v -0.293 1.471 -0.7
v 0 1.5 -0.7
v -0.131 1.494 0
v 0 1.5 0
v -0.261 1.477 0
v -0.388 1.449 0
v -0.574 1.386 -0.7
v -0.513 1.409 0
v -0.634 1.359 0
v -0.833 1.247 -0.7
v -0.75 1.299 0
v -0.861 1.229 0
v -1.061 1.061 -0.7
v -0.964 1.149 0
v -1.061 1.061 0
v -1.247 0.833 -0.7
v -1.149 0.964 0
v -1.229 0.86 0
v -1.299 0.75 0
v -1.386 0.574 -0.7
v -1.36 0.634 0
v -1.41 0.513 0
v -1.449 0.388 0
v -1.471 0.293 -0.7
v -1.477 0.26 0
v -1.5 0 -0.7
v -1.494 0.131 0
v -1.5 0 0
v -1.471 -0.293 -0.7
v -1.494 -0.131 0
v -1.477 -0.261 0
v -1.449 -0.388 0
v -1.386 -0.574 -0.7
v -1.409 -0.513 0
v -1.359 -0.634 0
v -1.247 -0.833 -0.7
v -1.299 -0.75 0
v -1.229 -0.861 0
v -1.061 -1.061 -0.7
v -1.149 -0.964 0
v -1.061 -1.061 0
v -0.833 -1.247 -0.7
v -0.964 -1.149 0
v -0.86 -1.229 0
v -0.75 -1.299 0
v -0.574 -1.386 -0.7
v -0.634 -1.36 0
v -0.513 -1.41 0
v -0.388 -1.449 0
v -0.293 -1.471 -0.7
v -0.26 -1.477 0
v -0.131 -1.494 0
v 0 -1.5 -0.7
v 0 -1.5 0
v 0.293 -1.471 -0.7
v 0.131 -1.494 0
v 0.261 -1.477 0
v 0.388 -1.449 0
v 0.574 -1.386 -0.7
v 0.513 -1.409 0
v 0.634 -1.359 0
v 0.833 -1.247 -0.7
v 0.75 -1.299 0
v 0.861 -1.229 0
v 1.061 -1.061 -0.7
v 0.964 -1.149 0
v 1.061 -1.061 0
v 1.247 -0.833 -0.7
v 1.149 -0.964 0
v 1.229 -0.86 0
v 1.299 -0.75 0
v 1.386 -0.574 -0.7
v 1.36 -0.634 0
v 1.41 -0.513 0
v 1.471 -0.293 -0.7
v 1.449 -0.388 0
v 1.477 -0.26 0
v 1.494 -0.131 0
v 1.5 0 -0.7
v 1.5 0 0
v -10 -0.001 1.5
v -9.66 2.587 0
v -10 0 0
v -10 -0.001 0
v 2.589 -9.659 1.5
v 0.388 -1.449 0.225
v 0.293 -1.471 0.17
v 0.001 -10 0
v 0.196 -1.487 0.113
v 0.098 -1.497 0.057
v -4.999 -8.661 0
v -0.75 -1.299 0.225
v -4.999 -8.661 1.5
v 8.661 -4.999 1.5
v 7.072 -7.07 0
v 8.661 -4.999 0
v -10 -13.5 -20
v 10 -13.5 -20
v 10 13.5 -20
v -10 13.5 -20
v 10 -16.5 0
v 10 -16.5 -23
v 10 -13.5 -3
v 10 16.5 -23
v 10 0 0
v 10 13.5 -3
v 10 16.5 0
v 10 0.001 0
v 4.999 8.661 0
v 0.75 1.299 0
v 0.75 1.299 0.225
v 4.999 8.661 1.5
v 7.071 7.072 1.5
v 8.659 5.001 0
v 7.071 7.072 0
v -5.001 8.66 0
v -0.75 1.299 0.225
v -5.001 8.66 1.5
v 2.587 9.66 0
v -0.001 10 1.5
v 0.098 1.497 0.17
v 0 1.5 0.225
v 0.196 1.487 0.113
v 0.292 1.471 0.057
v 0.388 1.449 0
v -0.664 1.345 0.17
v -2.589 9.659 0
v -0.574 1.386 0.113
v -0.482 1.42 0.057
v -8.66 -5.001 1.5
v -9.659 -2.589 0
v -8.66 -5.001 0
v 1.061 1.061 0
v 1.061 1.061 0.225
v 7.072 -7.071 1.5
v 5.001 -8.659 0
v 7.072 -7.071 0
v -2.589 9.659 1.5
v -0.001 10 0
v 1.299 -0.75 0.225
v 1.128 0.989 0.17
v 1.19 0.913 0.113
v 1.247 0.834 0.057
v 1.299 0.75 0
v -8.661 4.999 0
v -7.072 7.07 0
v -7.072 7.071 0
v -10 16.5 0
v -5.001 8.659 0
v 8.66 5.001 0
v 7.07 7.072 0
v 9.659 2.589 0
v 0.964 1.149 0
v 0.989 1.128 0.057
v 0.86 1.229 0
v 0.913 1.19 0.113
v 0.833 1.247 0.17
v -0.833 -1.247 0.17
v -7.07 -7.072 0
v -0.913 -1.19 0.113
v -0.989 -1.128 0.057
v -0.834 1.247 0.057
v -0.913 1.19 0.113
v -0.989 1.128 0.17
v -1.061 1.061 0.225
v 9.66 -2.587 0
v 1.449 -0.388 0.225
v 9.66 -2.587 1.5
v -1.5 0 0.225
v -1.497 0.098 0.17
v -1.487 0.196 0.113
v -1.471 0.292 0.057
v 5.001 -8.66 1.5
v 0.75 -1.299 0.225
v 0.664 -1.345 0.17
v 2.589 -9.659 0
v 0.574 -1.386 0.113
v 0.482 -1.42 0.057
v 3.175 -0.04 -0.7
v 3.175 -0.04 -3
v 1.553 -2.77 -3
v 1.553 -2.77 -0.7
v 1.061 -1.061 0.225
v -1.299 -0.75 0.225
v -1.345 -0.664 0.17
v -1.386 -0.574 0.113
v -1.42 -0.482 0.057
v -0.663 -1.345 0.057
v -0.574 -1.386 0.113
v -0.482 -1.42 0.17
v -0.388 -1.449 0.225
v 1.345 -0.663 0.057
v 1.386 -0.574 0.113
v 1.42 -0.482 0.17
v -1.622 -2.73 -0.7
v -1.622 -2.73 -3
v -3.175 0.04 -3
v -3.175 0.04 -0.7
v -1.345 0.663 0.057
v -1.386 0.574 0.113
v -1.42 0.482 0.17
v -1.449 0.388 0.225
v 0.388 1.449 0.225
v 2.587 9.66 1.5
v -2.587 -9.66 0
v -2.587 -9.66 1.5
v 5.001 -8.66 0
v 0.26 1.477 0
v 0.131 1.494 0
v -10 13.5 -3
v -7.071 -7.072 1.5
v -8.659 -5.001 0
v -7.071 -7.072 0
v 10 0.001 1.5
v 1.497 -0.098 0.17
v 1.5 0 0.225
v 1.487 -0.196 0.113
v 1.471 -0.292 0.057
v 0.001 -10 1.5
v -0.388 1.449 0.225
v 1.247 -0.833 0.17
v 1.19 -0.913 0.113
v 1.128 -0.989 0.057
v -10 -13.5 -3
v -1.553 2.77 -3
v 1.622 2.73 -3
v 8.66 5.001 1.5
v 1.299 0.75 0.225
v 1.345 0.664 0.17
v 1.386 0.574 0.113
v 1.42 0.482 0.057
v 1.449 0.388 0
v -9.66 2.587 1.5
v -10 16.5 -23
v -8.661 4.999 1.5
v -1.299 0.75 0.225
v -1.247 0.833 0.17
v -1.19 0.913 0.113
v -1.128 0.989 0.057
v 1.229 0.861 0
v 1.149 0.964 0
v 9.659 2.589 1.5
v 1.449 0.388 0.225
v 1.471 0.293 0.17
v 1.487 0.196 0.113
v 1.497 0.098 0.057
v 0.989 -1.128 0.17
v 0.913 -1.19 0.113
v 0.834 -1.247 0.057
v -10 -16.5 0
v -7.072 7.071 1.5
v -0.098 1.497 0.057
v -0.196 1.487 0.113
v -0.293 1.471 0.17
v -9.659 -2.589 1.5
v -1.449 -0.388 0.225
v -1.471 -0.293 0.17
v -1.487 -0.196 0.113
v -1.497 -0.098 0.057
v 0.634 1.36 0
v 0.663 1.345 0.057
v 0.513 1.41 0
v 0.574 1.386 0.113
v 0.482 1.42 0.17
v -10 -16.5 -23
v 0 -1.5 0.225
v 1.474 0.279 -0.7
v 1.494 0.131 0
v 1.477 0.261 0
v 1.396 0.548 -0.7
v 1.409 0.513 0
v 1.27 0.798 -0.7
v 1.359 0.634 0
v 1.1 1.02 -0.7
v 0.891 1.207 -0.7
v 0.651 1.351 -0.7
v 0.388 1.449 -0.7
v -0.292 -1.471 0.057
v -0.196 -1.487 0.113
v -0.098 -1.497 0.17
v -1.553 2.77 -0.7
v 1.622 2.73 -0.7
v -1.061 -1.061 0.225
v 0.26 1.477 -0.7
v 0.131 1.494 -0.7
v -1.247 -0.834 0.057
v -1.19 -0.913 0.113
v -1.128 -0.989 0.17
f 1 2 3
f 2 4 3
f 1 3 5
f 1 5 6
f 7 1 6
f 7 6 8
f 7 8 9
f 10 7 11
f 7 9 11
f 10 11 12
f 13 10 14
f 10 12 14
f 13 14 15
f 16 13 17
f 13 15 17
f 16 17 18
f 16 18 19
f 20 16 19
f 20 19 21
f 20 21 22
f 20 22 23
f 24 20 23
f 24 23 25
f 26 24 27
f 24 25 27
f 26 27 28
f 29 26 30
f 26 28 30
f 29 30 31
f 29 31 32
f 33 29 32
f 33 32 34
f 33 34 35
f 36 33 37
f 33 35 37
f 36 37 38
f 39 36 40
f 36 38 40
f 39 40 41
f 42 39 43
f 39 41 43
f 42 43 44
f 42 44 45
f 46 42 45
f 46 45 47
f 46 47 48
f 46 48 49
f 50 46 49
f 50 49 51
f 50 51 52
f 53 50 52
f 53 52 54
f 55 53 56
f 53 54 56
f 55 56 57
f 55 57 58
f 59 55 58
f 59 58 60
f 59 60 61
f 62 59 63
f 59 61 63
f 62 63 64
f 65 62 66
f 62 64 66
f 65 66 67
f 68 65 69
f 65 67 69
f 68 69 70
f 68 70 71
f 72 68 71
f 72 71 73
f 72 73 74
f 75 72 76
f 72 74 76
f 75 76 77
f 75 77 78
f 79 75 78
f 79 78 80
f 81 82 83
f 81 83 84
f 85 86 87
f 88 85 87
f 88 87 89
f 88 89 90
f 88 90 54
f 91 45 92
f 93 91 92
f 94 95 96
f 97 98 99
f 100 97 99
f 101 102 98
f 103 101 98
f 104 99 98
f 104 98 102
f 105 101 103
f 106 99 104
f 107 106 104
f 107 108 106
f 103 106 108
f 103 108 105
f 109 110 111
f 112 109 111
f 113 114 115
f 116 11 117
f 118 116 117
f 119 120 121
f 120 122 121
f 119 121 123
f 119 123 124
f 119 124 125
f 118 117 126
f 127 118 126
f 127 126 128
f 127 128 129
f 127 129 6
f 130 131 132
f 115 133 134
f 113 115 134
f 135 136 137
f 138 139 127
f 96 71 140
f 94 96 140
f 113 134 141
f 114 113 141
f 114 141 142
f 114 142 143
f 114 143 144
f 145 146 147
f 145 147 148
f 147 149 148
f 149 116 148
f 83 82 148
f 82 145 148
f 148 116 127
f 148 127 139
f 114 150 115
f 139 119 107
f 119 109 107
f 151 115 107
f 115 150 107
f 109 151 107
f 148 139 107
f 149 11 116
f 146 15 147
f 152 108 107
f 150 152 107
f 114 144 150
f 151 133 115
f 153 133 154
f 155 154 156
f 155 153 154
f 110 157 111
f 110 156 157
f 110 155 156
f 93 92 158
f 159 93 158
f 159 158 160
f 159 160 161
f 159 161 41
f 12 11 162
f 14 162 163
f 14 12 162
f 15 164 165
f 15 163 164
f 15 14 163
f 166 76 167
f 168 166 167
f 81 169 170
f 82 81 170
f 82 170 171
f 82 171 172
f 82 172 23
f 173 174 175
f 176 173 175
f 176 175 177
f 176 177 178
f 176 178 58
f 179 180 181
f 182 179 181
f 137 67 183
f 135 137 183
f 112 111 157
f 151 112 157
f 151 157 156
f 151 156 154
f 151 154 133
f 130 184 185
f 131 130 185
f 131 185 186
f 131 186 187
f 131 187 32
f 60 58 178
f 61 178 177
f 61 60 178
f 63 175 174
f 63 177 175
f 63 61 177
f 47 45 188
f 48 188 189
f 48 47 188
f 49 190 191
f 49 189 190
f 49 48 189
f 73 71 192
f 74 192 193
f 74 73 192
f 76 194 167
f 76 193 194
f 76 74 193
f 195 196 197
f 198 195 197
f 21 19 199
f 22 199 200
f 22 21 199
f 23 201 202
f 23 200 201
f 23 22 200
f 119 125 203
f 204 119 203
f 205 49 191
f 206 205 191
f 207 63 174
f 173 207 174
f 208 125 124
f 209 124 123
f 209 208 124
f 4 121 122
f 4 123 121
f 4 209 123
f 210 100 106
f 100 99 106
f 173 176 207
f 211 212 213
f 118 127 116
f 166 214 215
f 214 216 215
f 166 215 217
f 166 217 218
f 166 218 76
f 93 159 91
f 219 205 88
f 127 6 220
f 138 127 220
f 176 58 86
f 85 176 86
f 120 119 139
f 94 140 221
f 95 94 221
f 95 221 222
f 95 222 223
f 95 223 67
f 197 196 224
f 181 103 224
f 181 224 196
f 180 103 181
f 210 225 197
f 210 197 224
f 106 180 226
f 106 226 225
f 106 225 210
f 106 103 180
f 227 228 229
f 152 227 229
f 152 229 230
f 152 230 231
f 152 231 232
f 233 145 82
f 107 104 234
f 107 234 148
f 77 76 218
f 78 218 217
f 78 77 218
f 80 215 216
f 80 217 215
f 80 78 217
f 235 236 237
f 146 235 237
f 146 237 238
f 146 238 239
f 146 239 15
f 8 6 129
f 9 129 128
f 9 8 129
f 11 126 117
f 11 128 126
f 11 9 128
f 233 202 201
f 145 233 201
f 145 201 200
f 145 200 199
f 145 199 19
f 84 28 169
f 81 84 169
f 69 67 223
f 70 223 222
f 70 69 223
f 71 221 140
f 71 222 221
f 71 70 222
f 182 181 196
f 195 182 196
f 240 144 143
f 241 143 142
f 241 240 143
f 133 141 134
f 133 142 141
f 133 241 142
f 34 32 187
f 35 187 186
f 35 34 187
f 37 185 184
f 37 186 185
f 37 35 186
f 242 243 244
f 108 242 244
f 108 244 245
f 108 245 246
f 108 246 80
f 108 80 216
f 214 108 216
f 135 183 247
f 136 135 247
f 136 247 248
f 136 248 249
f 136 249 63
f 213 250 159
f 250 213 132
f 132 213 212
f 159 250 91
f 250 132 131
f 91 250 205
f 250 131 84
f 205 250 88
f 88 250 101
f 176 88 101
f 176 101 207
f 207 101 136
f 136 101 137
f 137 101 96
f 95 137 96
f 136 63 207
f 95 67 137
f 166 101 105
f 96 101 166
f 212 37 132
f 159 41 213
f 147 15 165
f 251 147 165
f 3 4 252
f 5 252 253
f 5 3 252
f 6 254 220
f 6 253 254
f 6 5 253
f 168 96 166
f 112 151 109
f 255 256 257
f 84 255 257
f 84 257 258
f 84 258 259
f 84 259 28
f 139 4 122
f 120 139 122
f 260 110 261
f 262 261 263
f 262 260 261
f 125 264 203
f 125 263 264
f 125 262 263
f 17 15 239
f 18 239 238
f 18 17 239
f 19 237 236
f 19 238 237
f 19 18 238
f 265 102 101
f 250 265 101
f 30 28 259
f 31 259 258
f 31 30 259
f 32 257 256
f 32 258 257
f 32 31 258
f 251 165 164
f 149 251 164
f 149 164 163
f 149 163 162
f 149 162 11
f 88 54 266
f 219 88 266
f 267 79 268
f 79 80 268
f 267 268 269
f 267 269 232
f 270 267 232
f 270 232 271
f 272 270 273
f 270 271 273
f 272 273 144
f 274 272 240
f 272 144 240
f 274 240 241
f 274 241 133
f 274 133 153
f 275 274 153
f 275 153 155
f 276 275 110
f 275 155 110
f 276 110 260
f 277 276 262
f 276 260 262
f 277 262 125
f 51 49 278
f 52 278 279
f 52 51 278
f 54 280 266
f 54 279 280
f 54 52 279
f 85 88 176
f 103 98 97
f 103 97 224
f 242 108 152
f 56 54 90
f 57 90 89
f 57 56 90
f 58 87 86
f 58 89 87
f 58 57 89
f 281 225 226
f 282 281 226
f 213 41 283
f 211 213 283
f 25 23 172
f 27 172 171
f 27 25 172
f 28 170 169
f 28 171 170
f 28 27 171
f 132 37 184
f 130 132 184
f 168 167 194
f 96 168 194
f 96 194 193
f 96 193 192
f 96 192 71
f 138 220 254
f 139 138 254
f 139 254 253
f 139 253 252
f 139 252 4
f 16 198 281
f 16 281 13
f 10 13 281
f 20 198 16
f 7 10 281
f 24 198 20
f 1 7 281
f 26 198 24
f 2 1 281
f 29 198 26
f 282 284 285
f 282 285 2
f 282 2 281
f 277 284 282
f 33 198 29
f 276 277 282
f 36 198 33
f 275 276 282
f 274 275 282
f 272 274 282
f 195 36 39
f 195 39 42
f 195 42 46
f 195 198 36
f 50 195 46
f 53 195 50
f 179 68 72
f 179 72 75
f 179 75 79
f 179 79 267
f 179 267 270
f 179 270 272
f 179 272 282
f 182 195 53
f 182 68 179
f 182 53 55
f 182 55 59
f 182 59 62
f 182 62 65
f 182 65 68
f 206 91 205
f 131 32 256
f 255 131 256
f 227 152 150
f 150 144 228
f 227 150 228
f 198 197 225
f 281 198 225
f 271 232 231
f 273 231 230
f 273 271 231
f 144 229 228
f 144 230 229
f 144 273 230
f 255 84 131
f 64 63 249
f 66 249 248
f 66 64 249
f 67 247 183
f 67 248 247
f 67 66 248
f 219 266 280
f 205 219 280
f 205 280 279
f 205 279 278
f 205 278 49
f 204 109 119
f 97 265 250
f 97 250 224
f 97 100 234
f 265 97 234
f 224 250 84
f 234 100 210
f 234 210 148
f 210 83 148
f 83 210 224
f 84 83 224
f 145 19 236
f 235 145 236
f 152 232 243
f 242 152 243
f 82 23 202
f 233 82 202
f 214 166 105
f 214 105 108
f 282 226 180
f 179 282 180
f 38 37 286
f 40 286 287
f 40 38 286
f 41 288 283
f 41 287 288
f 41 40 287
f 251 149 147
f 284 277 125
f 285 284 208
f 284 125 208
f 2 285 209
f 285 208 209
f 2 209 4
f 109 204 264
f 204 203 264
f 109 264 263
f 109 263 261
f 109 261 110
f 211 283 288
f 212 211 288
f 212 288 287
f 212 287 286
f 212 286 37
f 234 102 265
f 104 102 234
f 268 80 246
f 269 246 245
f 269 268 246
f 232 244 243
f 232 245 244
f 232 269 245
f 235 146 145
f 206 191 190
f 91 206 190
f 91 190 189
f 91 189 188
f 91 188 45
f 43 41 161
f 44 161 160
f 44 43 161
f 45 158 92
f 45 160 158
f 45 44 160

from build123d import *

# Parameters (mm, degrees)
F5_COUNT      = 24
F6_W          = 33
F6_H          = 23
F6_W_2        = 27
F6_H_2        = 17
F7_DEPTH      = 10
F7_DEPTH_BACK = 10
F8_DEPTH      = 3
F8_DEPTH_BACK = 5
F10_DEPTH     = 2.3


with BuildPart() as f3:
    # F2 (on line) → F3 section 0
    with BuildSketch(Plane(origin=(1.2938400436, 9.8296975, 0), x_dir=(-0.9914483093, 0.1305, 0), z_dir=(0.1305, 0.9914483093, 0)), mode=Mode.PRIVATE) as f3_s0:
        Polygon((-1.3041549828, 0), (1.3058450172, 0), (1.3058450172, 1.5), align=None)
    loft([f3_s0.sketch, Vertex(0, 0, 0)])

    # F5: F3 ×24 about axis
    f5_axis = Axis((0, 0, 1.9288011827), (0, 0, 1))


with BuildPart() as f3_1:
    add(f3.part)
    for i in range(1, F5_COUNT):
        add(f3.part.rotate(f5_axis, i * 360 / F5_COUNT))

    # F6 (on Right) → F7 (join, two sides)
    with BuildSketch(Plane.YZ) as f7_sk:
        with Locations((0, -11.5)):
            Rectangle(F6_W, F6_H)
        with Locations((0, -11.5)):
            Rectangle(F6_W_2, F6_H_2, mode=Mode.SUBTRACT)
    extrude(amount=F7_DEPTH)
    extrude(f7_sk.sketch, amount=-F7_DEPTH_BACK)

    # F0 (on Top) → F8 (cut, two sides)
    with BuildSketch(Plane.XY) as f8_sk:
        with BuildLine():
            ThreePointArc((1.5, 0), (1.1900058865, 0.9131735816), (0.3881520131, 1.44890925))
            Line((0.3881520131, 1.44890925), (0, 0))
            Line((0, 0), (0, 1.5))
            ThreePointArc((0, 1.5), (-1.0606601718, -1.0606601718), (1.5, 0))
        make_face()
        with BuildLine():
            Line((0, 0), (0.3881520131, 1.44890925))
            ThreePointArc((0.3881520131, 1.44890925), (0.19575, 1.4871724639), (0, 1.5))
            Line((0, 1.5), (0, 0))
        make_face()
    extrude(amount=-F8_DEPTH, mode=Mode.SUBTRACT)
    extrude(f8_sk.sketch, amount=F8_DEPTH_BACK, mode=Mode.SUBTRACT)

    # F9 (on face) → F10 (cut)
    with BuildSketch(Plane(origin=(0, 0, -3), x_dir=(1, 0, 0), z_dir=(0, 0, -1))):
        Polygon((-3.1751729007, -0.0401295912), (-1.5528332049, -2.769845189), (1.6223396958, -2.7297155978), (3.1751729007, 0.0401295912), (1.5528332049, 2.769845189), (-1.6223396958, 2.7297155978), align=None)
    extrude(amount=-F10_DEPTH, mode=Mode.SUBTRACT)


solid = f3_1.part
